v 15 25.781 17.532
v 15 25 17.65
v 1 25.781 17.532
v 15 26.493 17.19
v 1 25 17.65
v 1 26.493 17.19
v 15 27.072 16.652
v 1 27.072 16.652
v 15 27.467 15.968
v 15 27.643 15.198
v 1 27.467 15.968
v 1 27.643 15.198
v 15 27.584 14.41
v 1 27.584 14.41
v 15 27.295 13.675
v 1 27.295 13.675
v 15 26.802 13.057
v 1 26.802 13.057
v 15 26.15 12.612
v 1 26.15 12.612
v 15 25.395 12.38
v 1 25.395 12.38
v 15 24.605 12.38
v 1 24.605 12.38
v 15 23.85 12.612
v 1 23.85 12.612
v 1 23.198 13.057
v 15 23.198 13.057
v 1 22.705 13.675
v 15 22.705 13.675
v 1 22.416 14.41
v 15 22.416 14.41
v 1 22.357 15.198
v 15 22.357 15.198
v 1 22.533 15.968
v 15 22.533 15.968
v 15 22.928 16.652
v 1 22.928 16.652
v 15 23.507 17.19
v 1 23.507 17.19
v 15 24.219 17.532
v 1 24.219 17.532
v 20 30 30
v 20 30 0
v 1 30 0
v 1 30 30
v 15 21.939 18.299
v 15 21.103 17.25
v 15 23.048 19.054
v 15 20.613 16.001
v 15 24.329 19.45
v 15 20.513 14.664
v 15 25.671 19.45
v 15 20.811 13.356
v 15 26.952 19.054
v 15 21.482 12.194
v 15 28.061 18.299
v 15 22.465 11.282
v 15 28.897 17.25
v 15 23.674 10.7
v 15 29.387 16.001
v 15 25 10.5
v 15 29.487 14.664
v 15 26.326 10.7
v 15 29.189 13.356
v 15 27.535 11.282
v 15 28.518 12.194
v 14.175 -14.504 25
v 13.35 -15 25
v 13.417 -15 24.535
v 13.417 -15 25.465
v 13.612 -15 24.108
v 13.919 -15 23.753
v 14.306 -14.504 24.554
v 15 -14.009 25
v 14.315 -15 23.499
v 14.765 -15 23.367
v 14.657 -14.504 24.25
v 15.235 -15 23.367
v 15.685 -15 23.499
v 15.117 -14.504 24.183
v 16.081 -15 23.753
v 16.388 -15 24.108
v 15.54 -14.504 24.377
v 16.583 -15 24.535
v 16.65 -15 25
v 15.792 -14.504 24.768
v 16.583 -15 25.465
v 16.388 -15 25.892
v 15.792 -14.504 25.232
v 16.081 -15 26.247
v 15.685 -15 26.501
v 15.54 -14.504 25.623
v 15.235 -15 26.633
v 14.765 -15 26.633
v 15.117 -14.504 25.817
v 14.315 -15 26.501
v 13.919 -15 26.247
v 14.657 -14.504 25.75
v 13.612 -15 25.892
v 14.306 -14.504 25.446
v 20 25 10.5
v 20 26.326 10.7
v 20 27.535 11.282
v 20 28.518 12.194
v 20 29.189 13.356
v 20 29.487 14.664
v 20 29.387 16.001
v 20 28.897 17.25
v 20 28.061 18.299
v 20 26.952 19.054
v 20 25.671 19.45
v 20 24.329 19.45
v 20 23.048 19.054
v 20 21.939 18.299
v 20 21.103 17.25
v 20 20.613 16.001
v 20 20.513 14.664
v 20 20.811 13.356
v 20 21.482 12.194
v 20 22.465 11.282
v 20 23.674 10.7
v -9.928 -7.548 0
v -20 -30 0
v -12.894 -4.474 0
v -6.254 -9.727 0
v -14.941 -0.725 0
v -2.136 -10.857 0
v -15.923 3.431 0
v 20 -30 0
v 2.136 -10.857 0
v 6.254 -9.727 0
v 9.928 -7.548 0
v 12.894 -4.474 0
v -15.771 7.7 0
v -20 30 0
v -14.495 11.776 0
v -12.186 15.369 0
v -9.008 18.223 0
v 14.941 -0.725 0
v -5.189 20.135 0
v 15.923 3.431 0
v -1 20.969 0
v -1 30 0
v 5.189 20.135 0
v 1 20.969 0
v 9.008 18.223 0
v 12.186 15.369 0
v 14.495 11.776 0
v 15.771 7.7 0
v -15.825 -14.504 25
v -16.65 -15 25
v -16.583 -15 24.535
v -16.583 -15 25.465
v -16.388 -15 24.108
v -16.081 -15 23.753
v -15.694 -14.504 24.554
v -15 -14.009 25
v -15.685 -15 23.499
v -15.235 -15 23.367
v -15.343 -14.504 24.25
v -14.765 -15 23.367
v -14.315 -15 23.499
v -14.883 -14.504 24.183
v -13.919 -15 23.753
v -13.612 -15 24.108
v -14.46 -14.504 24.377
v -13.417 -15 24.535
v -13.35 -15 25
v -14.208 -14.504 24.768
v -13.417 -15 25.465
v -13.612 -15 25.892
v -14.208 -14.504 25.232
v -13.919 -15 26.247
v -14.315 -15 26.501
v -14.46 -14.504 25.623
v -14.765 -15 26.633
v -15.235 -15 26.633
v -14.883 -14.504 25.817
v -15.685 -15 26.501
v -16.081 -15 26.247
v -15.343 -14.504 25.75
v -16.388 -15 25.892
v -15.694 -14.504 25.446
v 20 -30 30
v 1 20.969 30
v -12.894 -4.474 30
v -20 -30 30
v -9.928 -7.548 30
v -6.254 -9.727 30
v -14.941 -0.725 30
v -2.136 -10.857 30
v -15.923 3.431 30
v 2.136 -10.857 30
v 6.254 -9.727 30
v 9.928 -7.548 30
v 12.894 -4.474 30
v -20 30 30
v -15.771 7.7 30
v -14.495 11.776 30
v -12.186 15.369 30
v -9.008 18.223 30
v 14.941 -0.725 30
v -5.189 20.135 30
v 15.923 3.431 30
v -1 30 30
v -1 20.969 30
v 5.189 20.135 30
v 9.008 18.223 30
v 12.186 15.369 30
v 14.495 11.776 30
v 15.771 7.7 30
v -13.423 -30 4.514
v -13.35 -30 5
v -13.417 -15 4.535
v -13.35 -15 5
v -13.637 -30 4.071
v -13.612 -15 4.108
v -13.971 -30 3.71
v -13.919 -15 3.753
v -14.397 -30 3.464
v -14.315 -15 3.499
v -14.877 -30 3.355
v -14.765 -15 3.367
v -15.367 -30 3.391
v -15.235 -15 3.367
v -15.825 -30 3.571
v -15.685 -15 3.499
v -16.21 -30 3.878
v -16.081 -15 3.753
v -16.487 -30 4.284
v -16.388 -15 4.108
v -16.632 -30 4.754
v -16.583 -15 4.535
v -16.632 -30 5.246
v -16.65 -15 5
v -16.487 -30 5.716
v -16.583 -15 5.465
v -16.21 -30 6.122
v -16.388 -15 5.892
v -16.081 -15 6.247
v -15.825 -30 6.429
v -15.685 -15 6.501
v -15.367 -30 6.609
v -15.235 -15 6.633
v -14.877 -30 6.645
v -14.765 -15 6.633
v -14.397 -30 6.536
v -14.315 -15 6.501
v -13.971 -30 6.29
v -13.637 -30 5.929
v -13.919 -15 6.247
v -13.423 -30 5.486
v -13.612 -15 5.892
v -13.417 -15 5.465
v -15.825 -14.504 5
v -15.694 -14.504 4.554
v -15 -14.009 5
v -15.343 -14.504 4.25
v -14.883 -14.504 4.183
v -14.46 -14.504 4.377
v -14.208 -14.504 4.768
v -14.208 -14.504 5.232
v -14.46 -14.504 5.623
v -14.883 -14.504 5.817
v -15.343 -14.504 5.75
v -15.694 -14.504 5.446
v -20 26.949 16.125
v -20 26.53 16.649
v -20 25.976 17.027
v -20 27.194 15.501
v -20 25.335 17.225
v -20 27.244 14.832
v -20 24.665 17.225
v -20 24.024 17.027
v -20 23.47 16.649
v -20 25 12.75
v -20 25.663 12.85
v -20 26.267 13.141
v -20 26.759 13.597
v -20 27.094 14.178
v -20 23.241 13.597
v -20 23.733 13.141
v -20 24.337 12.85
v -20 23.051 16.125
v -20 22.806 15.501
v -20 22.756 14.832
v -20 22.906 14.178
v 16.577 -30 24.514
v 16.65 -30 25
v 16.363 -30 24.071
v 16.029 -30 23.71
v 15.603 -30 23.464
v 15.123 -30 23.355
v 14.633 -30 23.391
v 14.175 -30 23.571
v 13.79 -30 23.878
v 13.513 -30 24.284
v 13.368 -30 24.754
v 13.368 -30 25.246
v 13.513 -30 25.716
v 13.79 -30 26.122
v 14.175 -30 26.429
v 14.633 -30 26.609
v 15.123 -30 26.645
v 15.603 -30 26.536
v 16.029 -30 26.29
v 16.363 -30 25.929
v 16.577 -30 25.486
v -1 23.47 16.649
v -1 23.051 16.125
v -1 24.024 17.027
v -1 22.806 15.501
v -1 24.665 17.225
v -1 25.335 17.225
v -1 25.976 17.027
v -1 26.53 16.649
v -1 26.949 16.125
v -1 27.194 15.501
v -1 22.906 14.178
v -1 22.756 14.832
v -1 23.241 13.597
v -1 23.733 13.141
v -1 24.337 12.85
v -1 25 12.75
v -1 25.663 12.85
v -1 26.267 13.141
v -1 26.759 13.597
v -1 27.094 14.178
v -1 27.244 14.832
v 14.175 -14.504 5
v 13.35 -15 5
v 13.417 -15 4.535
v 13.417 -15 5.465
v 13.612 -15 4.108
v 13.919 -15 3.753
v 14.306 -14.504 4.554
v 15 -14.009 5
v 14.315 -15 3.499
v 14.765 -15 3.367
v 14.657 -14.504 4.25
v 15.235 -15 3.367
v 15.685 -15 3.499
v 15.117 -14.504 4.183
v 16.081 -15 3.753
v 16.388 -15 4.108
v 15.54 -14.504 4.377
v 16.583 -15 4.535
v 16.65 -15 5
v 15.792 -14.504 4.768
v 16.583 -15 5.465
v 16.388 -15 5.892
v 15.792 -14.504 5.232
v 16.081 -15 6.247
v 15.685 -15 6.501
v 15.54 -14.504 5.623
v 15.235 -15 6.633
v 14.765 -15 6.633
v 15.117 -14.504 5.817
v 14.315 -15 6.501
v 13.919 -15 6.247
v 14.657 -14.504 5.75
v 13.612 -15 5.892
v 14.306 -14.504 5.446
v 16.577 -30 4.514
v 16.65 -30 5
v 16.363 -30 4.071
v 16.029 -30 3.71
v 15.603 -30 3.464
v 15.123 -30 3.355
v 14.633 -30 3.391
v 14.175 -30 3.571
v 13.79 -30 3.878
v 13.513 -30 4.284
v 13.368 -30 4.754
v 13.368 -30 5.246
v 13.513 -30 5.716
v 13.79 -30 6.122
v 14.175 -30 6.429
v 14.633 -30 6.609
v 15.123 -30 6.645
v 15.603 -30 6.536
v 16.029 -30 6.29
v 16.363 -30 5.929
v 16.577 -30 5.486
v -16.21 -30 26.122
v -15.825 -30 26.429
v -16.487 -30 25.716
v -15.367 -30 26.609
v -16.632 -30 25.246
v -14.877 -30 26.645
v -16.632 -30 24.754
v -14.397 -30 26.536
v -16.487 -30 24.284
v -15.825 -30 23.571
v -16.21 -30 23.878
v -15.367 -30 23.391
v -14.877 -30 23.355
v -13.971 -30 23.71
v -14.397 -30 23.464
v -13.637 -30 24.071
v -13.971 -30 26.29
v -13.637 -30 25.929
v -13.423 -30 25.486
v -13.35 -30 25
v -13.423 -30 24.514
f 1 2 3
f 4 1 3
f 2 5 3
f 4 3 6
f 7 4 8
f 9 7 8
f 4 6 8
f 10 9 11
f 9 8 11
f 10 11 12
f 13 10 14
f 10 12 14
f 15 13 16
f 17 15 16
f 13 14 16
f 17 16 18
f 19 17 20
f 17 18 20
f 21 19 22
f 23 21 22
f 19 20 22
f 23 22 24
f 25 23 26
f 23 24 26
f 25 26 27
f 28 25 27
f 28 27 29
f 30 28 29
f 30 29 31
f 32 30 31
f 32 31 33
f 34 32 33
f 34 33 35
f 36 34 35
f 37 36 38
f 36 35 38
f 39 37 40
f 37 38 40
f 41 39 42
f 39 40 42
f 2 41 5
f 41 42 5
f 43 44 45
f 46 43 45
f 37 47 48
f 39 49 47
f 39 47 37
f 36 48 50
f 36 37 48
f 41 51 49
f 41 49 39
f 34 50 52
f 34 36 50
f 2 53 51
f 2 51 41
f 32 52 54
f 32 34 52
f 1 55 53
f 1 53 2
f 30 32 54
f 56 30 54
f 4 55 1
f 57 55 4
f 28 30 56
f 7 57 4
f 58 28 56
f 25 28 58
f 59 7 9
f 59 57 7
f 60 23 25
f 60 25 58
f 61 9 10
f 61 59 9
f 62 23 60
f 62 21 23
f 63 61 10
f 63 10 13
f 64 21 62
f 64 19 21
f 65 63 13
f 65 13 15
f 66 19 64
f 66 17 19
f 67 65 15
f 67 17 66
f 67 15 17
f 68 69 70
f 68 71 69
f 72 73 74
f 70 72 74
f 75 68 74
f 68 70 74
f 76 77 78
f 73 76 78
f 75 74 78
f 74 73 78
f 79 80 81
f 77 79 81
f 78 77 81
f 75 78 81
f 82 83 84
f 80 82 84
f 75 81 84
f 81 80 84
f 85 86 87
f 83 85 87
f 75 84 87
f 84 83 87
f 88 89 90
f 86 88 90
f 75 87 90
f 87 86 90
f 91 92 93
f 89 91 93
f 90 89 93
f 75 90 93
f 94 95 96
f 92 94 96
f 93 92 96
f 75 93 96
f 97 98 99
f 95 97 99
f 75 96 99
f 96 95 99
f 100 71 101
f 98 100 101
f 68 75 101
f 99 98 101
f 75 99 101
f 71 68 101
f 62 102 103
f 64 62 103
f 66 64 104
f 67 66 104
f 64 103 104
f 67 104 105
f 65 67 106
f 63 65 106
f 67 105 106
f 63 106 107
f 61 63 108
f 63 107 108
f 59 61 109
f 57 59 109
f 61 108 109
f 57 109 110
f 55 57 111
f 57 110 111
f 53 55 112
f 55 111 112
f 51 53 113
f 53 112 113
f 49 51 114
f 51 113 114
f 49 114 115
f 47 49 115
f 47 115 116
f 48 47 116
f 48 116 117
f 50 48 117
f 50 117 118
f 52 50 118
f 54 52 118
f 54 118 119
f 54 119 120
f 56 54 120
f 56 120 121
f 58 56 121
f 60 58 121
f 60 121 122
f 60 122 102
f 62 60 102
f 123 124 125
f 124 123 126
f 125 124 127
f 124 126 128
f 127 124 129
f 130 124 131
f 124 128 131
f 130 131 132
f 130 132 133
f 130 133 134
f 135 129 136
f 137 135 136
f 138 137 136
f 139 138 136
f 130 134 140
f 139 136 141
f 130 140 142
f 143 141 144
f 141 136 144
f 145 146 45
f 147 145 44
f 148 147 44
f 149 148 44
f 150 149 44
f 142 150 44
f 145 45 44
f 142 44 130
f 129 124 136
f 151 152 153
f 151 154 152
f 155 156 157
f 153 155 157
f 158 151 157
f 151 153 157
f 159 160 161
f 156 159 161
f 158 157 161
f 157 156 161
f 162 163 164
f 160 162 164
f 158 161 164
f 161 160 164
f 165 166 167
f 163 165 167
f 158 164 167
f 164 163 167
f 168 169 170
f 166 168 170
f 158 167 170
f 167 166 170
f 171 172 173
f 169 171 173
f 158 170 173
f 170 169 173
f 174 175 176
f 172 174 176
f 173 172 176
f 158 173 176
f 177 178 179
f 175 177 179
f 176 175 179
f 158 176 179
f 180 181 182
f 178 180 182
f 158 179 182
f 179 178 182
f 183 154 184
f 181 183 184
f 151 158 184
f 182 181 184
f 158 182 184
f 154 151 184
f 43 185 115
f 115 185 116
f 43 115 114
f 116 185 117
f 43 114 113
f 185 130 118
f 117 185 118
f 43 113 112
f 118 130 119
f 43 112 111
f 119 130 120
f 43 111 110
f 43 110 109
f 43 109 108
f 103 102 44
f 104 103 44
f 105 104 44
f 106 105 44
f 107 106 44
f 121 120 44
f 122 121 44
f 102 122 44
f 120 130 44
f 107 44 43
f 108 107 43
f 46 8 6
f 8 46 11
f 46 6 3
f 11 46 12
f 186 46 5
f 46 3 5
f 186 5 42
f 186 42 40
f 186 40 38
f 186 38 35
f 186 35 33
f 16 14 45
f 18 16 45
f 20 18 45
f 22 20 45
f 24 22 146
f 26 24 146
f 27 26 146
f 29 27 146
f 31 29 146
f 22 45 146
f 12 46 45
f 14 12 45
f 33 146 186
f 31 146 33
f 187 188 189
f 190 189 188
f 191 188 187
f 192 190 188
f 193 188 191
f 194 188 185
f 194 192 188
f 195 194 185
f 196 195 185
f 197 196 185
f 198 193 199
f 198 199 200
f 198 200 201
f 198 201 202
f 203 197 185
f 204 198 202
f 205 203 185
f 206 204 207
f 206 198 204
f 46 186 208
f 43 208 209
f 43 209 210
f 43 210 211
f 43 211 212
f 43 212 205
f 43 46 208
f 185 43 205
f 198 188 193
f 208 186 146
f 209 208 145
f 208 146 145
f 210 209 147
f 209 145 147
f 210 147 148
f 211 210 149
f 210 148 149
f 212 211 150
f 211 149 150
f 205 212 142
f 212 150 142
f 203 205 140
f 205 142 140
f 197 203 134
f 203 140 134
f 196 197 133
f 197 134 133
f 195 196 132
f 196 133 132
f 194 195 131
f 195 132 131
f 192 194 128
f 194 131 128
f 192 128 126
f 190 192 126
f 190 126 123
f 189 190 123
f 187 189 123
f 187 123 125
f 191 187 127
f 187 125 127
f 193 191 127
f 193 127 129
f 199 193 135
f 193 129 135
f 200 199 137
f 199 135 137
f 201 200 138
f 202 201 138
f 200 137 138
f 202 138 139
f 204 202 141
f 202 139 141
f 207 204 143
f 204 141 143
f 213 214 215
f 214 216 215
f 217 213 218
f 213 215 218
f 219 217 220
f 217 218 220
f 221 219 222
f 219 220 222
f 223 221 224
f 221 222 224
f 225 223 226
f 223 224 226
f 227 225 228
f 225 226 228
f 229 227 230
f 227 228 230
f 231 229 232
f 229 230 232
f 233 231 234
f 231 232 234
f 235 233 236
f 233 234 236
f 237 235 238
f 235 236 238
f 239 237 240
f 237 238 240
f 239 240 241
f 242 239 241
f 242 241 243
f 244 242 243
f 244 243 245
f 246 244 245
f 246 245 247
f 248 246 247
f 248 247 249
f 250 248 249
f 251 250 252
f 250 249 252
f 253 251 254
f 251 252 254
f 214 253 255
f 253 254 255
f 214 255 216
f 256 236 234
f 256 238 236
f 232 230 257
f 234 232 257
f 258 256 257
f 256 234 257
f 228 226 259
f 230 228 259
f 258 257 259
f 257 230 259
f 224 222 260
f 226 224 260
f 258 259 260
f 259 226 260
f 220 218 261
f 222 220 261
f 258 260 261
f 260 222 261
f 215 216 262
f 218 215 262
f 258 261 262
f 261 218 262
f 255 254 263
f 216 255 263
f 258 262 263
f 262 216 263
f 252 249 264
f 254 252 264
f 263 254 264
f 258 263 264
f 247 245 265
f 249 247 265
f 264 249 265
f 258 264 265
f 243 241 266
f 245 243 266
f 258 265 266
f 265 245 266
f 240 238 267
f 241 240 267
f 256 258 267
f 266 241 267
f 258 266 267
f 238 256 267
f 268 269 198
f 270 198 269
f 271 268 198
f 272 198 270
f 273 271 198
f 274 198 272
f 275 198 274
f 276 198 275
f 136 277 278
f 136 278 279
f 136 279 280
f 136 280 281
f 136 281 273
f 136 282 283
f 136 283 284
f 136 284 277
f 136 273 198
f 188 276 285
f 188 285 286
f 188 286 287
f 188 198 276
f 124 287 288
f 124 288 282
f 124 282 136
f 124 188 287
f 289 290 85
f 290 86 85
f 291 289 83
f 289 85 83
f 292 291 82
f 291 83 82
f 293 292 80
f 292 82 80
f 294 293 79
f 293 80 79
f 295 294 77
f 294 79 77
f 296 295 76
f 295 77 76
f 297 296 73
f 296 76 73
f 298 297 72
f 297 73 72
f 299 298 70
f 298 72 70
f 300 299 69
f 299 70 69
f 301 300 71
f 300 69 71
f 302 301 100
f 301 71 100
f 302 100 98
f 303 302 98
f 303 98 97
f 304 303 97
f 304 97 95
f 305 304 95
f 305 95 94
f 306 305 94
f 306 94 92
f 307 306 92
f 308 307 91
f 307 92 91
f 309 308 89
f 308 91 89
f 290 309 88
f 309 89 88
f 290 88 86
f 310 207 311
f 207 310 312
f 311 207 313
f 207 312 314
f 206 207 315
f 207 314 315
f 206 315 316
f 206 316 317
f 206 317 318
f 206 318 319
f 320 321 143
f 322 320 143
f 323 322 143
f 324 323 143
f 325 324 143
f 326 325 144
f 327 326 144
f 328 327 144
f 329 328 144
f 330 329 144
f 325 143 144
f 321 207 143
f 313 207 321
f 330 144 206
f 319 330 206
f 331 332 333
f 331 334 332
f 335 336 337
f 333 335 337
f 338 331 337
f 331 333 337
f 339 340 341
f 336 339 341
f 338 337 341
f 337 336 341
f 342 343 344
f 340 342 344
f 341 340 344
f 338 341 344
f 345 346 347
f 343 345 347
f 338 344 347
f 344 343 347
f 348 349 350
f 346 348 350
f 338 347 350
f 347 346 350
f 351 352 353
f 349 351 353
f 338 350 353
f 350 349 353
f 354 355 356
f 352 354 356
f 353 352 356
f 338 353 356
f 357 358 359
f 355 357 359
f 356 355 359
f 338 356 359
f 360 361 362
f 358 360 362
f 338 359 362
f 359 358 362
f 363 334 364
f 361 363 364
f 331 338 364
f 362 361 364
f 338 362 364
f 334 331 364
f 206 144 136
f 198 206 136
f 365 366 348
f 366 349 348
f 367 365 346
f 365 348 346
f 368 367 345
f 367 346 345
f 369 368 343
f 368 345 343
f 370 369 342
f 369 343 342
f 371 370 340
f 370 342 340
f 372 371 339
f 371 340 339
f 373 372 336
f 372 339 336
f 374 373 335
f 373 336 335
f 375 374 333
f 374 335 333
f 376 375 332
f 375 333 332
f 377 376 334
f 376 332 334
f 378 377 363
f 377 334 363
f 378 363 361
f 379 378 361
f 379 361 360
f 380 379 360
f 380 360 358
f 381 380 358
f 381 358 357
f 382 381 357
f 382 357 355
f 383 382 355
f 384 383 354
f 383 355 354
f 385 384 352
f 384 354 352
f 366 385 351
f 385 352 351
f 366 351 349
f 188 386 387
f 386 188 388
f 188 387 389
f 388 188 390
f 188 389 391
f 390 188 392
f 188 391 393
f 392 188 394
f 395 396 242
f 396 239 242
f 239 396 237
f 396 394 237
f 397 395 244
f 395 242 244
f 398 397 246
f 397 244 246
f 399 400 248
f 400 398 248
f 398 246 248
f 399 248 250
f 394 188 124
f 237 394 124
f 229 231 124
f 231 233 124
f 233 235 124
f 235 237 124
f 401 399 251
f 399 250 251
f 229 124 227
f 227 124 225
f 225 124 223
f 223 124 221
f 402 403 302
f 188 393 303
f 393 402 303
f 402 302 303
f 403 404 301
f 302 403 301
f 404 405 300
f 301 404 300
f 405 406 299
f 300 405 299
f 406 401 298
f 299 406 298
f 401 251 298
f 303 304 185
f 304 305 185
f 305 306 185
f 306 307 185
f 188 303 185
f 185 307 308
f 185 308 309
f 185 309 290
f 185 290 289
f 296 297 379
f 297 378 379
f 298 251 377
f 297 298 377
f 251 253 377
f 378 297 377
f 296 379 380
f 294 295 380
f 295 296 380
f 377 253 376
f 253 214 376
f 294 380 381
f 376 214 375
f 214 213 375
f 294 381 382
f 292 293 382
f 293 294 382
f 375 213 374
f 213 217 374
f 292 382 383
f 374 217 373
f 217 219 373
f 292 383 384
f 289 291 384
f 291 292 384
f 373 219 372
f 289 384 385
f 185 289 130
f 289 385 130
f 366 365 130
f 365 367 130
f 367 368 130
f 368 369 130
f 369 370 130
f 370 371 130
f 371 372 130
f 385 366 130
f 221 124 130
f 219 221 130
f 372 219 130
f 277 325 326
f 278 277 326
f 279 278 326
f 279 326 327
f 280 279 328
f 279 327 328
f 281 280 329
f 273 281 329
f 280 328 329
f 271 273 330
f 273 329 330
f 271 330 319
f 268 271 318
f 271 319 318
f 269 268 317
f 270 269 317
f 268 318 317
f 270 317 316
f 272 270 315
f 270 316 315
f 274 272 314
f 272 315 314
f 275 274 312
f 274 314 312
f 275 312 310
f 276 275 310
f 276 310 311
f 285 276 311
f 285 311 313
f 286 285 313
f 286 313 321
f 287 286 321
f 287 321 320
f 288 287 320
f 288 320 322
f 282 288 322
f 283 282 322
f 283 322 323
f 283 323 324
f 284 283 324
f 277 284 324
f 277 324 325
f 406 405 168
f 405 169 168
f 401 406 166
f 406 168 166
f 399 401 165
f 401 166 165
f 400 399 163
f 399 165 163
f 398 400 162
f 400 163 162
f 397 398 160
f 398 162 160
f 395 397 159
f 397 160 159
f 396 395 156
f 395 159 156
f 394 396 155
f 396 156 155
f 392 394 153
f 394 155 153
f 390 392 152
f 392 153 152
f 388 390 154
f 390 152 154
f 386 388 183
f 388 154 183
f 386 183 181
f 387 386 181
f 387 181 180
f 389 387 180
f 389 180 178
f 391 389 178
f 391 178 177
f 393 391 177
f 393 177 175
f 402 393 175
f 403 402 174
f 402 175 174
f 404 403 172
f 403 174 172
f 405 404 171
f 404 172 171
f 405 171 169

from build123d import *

# Parameters (mm, degrees)
SALIENTE_EXTRUIR1_DEPTH                              = 30
TALADRO_ROSCADO_M4X0_71_D                            = 3.3
TALADRO_ROSCADO_M4X0_71_DEPTH                        = 15
TALADRO_ROSCADO_M4X0_71_TIP                          = 0.991420021
REFRENTADO_PARA_TORNILLO_TAP_N_CON_CABEZ_D           = 5.3
REFRENTADO_PARA_TORNILLO_TAP_N_CON_CABEZ_CBORE_D     = 9
REFRENTADO_PARA_TORNILLO_TAP_N_CON_CABEZ_CBORE_DEPTH = 5
CROQUIS9_R                                           = 2.65
SALIENTE_EXTRUIR2_DEPTH                              = 19
TALADRO_ROSCADO_M5X0_82_D                            = 4.5


with BuildPart() as part:
    # Croquis1 → Saliente-Extruir1 (new body)
    with BuildSketch(Plane.XY):
        with BuildLine():
            Line((-20, -30), (20, -30))
            Line((20, -30), (20, 30))
            Line((20, 30), (1, 30))
            Line((1, 30), (1, 20.968719423))
            ThreePointArc((1, 20.968719423), (0, -11), (-1, 20.968719423))
            Line((-1, 20.968719423), (-1, 30))
            Line((-1, 30), (-20, 30))
            Line((-20, 30), (-20, -30))
        make_face()
    extrude(amount=SALIENTE_EXTRUIR1_DEPTH)

    # Taladro roscado M4x0.71
    with Locations(Plane(origin=(0, -30, 0), x_dir=(-1, 0, 0), z_dir=(0, -1, 0))):
        with Locations((-15, -5), (-15, -25), (15, -5), (15, -25)):
            Hole(TALADRO_ROSCADO_M4X0_71_D / 2, depth=TALADRO_ROSCADO_M4X0_71_DEPTH)
            with Locations((0, 0, -(TALADRO_ROSCADO_M4X0_71_DEPTH + TALADRO_ROSCADO_M4X0_71_TIP / 2))):  # 118° drill point
                Cone(0, TALADRO_ROSCADO_M4X0_71_D / 2, TALADRO_ROSCADO_M4X0_71_TIP, mode=Mode.SUBTRACT)

    # Refrentado para tornillo tapón con cabeza de clavija de M52 (through all)
    with Locations(Plane(origin=(20, 0, 0), x_dir=(0, 0, -1), z_dir=(1, 0, 0))):
        with Locations((-15, 25)):
            CounterBoreHole(REFRENTADO_PARA_TORNILLO_TAP_N_CON_CABEZ_D / 2, REFRENTADO_PARA_TORNILLO_TAP_N_CON_CABEZ_CBORE_D / 2, REFRENTADO_PARA_TORNILLO_TAP_N_CON_CABEZ_CBORE_DEPTH)

    # Croquis9 → Saliente-Extruir2 (add)
    with BuildSketch(Plane.ZY.offset(20)):
        with Locations(Location((15, 25, 0), (0, 0, 180))):
            Circle(CROQUIS9_R)
    extrude(amount=-SALIENTE_EXTRUIR2_DEPTH)

    # Taladro roscado M5x0.82 (through all)
    with Locations(Plane.ZY.offset(20)):
        with Locations((15, 25)):
            Hole(TALADRO_ROSCADO_M5X0_82_D / 2)


solid = part.part
